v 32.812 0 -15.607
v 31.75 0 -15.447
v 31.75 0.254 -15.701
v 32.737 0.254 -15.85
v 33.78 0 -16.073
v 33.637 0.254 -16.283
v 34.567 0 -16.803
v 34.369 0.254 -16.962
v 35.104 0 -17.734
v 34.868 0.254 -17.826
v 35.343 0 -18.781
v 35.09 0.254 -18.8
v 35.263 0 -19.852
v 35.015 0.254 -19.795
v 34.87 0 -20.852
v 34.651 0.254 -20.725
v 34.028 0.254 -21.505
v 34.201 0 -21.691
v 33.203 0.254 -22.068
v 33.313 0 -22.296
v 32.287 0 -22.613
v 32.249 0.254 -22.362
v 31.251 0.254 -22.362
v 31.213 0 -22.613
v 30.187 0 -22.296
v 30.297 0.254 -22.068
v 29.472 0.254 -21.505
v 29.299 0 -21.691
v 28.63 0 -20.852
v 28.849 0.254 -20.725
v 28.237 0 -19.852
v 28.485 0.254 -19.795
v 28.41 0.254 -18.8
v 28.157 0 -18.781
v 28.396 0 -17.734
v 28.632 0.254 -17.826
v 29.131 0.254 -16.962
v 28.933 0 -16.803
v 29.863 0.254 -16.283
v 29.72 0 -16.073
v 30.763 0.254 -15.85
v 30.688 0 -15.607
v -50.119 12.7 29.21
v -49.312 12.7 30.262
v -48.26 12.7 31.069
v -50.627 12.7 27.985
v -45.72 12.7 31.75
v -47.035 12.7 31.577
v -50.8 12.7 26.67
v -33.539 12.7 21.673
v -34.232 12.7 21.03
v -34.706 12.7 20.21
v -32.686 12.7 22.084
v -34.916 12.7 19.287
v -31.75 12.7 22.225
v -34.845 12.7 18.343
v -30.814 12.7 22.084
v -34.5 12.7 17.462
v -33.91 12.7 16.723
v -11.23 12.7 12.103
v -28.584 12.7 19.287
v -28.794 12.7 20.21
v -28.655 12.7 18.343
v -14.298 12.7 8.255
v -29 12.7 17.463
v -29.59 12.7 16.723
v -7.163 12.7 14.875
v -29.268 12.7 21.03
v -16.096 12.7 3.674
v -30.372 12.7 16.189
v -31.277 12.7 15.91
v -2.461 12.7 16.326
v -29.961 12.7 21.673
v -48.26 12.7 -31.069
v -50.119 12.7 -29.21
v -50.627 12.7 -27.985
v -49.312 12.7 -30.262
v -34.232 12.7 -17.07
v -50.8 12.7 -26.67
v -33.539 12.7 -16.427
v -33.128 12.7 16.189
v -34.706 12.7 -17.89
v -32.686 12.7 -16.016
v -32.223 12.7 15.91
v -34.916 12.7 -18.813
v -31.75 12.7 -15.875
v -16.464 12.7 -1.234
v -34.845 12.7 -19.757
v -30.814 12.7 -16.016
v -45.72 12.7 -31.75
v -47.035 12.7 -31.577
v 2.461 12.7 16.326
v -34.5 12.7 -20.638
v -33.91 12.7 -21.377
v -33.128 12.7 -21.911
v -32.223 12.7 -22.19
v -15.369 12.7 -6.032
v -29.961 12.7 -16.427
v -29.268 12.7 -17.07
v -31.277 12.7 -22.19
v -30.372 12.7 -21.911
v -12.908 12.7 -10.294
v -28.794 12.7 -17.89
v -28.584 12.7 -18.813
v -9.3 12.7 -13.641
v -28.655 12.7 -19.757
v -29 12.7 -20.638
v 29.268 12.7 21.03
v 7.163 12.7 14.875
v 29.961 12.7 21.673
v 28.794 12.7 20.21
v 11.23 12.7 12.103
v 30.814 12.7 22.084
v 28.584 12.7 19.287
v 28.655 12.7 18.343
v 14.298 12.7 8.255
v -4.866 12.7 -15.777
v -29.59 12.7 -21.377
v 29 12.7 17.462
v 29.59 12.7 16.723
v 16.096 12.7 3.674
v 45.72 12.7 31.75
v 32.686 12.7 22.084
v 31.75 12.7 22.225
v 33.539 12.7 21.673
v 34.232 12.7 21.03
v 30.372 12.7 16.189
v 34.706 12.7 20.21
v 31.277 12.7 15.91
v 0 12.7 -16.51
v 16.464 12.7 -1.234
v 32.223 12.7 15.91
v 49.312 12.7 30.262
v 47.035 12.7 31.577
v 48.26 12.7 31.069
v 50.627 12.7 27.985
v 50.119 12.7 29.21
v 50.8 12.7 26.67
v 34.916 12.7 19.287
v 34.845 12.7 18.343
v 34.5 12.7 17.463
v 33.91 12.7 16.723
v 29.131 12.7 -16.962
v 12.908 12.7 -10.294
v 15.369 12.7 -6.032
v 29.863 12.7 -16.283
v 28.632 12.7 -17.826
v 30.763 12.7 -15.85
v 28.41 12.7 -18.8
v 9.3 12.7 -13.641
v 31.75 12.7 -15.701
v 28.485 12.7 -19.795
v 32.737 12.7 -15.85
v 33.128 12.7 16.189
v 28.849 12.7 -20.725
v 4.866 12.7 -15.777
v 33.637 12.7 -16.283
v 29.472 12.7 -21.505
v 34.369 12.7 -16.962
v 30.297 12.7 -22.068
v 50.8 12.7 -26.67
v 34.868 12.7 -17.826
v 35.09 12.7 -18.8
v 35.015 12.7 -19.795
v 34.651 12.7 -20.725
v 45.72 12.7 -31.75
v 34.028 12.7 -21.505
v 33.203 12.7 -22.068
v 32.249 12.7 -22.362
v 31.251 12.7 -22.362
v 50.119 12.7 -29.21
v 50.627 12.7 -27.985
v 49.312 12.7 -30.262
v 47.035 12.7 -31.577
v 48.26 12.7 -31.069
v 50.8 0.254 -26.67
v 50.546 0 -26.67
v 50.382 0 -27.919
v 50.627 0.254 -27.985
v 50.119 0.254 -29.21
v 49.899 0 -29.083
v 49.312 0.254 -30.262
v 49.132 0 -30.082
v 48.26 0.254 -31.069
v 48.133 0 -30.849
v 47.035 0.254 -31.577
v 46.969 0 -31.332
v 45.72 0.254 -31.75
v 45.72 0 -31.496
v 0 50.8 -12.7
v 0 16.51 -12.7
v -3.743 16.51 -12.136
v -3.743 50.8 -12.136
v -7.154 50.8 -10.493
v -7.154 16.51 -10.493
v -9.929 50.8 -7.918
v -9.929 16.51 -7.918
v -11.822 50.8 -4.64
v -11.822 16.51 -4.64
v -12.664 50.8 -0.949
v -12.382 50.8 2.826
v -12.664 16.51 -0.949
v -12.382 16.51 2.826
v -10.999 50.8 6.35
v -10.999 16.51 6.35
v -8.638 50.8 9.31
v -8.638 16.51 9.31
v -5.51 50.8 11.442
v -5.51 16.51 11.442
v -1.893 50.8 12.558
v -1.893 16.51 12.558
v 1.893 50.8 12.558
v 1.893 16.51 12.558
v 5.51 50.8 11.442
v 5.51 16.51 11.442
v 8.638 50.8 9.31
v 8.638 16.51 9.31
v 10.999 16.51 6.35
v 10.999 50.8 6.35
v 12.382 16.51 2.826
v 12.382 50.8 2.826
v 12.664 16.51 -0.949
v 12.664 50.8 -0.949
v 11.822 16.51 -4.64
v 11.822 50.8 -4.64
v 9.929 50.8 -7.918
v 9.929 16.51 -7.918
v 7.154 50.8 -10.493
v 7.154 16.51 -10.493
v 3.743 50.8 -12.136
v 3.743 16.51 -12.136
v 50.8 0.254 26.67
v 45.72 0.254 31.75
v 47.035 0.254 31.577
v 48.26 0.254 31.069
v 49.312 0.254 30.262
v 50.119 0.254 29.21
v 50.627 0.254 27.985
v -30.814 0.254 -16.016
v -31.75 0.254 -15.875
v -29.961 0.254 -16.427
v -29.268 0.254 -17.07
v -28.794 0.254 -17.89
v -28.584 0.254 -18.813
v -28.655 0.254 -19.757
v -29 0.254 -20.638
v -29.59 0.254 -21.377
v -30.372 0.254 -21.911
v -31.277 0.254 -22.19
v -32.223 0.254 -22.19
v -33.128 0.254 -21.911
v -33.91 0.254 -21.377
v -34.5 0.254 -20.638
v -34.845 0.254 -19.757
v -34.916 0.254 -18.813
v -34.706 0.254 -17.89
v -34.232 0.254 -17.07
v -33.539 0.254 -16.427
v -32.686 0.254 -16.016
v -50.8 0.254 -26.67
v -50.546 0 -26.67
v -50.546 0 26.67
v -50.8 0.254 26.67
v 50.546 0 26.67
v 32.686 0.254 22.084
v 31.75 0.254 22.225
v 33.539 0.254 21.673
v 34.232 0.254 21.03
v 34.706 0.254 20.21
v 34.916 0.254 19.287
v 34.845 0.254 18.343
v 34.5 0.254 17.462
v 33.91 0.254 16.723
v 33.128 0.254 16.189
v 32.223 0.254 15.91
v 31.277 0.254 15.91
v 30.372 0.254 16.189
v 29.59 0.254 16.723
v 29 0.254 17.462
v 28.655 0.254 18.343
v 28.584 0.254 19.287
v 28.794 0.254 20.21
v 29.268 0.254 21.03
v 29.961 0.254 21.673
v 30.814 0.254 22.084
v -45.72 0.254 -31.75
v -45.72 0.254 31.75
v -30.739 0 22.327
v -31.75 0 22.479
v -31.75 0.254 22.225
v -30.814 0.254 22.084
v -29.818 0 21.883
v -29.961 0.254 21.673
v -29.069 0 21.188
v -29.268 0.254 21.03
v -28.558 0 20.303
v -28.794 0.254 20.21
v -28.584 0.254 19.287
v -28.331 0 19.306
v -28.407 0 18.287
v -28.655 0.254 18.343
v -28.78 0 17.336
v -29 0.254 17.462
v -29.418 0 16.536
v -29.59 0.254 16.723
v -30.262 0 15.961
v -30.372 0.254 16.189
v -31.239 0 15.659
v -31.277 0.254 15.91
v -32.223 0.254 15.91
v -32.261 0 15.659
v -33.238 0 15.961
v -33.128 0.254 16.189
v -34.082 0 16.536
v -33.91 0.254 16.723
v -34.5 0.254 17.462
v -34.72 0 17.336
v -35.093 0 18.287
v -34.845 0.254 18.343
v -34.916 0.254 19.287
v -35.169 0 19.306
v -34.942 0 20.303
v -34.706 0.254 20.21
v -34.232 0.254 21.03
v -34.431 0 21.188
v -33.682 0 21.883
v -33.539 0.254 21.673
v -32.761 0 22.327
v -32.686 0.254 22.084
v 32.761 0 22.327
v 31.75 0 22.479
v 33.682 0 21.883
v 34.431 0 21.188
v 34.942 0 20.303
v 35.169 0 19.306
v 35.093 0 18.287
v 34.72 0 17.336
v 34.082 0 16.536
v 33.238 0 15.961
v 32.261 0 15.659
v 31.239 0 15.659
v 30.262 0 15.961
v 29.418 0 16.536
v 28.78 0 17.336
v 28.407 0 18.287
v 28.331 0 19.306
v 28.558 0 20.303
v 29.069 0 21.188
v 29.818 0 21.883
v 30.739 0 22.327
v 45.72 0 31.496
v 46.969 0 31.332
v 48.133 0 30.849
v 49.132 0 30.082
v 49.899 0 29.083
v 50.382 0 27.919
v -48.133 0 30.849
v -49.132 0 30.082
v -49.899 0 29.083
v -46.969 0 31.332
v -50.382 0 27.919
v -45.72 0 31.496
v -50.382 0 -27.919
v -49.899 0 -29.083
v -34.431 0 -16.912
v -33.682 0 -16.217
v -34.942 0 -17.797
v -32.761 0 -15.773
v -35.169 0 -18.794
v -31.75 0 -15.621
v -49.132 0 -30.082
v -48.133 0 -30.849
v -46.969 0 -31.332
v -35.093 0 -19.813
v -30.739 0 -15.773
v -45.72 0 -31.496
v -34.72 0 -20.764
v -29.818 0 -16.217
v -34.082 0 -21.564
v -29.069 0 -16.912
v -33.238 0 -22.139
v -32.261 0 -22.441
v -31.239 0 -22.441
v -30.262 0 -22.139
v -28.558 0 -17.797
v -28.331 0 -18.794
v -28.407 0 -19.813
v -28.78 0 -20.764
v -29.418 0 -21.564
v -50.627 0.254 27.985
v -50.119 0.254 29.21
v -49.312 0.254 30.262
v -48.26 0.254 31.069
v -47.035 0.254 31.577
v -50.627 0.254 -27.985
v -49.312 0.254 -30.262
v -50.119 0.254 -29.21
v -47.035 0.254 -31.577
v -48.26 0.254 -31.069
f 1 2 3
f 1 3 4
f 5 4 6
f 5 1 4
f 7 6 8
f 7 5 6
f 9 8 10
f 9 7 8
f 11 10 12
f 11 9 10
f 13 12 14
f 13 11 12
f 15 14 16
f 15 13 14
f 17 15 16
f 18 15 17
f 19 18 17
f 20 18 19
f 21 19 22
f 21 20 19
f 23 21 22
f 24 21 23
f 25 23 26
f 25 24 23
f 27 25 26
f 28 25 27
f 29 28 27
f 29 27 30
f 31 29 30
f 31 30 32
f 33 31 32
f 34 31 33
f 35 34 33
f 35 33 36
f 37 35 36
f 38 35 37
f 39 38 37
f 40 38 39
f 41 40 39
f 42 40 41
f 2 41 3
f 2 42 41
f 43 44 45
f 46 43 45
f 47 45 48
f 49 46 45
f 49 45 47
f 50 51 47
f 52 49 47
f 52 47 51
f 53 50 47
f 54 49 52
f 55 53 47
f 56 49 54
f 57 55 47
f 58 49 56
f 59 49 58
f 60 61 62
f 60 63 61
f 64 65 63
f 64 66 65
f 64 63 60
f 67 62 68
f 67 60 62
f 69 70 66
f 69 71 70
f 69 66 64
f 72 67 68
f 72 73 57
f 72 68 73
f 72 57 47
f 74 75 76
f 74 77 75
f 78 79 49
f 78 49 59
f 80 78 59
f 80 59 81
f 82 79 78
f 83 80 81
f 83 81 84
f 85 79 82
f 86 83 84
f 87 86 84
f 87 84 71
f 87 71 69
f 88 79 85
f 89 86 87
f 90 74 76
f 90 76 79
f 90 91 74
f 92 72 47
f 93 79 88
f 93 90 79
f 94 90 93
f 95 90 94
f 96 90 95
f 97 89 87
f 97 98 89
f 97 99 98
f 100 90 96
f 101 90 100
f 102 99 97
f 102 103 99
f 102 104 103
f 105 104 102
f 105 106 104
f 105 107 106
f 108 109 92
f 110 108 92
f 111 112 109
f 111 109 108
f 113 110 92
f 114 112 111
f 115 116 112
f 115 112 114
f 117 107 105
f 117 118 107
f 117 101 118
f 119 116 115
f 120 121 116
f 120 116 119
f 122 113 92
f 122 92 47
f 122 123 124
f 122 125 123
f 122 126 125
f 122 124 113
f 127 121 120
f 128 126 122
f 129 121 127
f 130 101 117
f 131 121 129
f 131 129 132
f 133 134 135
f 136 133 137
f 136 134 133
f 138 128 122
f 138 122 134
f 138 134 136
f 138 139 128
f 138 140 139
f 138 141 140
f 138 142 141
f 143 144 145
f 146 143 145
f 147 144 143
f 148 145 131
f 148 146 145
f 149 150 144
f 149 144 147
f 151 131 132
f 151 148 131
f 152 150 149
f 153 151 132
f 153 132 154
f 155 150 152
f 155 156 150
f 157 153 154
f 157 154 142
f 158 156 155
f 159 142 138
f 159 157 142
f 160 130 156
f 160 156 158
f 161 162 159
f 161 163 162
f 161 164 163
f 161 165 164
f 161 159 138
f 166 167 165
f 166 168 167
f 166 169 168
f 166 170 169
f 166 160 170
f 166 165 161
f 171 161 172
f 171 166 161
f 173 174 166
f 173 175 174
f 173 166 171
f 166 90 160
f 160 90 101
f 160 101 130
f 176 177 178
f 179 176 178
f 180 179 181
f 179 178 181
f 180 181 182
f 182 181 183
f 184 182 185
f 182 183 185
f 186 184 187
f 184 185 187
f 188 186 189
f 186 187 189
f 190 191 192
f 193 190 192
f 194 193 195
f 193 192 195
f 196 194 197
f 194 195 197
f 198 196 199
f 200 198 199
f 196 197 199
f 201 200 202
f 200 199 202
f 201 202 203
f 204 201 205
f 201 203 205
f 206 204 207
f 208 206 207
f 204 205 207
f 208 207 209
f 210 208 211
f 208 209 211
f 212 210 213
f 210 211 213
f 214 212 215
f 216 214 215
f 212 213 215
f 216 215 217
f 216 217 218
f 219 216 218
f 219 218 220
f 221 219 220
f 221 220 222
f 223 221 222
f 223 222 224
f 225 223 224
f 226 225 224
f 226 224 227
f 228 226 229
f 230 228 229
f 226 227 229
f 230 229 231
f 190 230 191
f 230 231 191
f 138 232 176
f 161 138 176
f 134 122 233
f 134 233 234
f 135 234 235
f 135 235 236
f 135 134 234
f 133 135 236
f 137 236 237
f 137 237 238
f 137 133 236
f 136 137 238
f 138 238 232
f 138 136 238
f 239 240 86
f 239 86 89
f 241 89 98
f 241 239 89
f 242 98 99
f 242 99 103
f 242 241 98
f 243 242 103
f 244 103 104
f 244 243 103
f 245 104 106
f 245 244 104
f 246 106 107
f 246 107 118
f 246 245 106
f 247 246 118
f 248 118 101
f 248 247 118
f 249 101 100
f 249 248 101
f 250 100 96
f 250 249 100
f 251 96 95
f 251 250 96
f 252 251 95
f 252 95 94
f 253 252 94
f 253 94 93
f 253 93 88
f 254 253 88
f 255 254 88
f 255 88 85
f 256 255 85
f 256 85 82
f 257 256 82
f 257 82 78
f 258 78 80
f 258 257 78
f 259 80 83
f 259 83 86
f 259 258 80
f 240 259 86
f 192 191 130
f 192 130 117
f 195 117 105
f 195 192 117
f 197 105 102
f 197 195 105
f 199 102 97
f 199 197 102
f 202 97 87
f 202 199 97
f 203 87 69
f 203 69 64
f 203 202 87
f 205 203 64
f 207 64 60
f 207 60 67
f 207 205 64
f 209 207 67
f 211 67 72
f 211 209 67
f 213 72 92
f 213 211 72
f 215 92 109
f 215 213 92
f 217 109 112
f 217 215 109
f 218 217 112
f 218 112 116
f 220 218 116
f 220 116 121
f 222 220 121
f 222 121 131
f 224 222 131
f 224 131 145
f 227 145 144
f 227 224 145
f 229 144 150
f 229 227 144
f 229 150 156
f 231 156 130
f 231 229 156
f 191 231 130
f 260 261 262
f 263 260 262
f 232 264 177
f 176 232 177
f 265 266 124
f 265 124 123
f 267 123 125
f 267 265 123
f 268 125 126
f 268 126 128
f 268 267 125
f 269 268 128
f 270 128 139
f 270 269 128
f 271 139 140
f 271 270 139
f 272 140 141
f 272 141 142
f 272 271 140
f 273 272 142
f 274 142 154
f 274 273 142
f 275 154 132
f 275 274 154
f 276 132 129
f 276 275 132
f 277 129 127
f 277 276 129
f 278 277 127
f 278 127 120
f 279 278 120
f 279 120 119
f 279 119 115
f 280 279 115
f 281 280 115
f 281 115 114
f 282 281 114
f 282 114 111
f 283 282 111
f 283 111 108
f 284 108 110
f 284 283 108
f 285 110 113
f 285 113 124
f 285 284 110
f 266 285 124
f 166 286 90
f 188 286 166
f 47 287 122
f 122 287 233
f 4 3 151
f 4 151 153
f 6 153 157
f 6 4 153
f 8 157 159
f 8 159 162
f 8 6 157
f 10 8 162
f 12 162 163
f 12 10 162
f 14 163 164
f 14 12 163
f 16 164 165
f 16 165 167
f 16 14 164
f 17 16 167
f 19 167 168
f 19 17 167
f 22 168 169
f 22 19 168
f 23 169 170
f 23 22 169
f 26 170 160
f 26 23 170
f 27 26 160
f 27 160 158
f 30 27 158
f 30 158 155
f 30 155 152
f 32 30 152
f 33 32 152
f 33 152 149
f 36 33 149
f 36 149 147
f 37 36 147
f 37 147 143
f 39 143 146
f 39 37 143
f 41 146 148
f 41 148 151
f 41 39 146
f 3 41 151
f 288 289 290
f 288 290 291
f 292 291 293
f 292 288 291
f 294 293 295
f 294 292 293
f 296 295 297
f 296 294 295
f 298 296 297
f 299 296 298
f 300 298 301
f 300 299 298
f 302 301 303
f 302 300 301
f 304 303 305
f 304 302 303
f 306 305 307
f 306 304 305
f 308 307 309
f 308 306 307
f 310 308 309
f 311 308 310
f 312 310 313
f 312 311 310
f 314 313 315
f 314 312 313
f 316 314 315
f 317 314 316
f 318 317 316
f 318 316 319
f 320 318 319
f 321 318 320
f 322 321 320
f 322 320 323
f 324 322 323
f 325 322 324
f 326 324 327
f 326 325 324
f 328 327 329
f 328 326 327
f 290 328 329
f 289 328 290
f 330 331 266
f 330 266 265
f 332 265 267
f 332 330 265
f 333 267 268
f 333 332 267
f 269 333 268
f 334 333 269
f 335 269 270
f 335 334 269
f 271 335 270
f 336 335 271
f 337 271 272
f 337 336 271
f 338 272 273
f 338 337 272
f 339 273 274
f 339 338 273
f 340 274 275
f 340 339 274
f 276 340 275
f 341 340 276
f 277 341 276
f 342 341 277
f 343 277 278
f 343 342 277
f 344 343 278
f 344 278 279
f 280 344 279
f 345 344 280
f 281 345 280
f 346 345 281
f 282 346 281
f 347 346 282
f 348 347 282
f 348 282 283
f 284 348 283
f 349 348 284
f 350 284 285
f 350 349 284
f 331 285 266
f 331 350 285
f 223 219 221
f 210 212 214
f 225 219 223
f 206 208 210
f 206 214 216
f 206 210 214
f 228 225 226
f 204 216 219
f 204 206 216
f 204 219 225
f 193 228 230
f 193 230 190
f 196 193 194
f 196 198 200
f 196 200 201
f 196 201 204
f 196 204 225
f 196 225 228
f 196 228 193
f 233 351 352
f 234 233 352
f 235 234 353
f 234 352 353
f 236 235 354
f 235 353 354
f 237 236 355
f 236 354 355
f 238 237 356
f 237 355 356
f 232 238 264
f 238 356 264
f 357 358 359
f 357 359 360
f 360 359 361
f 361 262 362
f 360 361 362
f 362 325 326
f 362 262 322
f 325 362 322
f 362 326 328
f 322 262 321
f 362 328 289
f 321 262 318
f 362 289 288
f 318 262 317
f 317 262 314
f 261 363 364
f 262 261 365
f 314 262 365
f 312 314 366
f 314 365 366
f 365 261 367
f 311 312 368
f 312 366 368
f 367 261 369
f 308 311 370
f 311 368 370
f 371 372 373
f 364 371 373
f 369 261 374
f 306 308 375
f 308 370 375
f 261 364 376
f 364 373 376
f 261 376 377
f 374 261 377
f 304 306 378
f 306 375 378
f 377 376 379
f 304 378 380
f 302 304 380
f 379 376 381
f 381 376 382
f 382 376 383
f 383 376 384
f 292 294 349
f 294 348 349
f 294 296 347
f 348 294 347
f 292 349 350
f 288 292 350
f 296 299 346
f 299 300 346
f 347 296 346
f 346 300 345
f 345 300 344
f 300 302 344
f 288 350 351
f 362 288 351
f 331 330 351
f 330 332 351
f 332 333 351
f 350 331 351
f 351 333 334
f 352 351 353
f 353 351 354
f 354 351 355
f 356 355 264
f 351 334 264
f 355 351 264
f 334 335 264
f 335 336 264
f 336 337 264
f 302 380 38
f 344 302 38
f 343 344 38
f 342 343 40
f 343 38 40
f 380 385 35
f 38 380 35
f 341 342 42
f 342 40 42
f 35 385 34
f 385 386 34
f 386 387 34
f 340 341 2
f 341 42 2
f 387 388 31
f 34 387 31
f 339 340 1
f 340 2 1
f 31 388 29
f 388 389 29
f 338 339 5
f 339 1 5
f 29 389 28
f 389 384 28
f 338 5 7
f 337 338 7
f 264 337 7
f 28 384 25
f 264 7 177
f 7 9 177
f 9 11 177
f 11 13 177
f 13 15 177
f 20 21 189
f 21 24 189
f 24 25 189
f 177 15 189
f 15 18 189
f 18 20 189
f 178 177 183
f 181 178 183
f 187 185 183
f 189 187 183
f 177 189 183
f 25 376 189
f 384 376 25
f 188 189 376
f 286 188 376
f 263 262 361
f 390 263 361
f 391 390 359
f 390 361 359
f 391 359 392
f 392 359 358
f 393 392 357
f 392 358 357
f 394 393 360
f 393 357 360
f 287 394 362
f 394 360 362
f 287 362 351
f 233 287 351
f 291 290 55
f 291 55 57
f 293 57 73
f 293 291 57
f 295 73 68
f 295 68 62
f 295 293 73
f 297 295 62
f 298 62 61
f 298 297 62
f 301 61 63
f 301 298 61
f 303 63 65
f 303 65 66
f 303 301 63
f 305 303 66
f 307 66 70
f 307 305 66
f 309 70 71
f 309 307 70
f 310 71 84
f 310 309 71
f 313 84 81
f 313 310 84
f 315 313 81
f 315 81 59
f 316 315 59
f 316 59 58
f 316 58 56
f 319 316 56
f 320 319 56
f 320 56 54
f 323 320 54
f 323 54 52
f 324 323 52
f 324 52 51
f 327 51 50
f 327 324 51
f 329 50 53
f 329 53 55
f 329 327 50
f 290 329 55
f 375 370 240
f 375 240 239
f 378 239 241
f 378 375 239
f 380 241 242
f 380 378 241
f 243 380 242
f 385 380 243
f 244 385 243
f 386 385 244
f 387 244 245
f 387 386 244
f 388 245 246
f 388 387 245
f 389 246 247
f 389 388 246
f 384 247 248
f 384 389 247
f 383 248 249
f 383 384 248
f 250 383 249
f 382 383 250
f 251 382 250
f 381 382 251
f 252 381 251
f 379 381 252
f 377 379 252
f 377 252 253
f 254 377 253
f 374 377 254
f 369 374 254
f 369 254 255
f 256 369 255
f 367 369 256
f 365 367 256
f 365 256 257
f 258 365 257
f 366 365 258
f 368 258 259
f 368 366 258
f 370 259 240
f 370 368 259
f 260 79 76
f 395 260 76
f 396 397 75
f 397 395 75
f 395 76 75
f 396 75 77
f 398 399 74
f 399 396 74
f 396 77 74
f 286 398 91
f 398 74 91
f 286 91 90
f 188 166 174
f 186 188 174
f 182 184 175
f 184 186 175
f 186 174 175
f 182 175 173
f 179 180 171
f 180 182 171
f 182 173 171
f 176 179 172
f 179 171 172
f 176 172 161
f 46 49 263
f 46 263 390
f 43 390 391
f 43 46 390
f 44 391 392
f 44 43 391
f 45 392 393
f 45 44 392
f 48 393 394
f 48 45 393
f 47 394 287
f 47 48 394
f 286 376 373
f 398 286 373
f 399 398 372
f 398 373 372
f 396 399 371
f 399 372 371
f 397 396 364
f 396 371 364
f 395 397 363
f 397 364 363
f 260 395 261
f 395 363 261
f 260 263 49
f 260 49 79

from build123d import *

# Parameters (mm, degrees)
SKETCH1_W           = 101.6
SKETCH1_H           = 63.5
SKETCH1_R           = 3.175
SKETCH1_R_2         = 3.349234597
BOSS_EXTRUDE1_DEPTH = 12.7
SKETCH2_R           = 12.7
BOSS_EXTRUDE2_DEPTH = 38.1
CHAMFER1_SIZE       = 3.81
FILLET1_R           = 5.08
CHAMFER2_SIZE       = 0.254


with BuildPart() as part:
    # Sketch1 → Boss-Extrude1 (new body)
    with BuildSketch(Plane(origin=(0, 0, 0), x_dir=(1, 0, 0), z_dir=(0, 1, 0))):
        Rectangle(SKETCH1_W, SKETCH1_H)
        with Locations(Location((-31.75, 19.05, 0), (0, 0, 270))):
            Circle(SKETCH1_R, mode=Mode.SUBTRACT)
        with Locations(Location((-31.75, -19.05, 0), (0, 0, 270))):
            Circle(SKETCH1_R, mode=Mode.SUBTRACT)
        with Locations(Location((31.75, -19.05, 0), (0, 0, 270))):
            Circle(SKETCH1_R, mode=Mode.SUBTRACT)
        with Locations(Location((31.75, 19.05, 0), (0, 0, 270))):
            Circle(SKETCH1_R_2, mode=Mode.SUBTRACT)
    extrude(amount=BOSS_EXTRUDE1_DEPTH)

    # Sketch2 → Boss-Extrude2 (add)
    with BuildSketch(Plane(origin=(0, 12.7, 0), x_dir=(1, 0, 0), z_dir=(0, 1, 0))):
        with Locations(Location((0, 0, 0), (0, 0, 90))):
            Circle(SKETCH2_R)
    extrude(amount=BOSS_EXTRUDE2_DEPTH)

    # Chamfer1
    chamfer1_edges = [part.edges().sort_by_distance(p)[0] for p in [
        (0, 12.7, 12.7),
    ]]
    chamfer(chamfer1_edges, length=CHAMFER1_SIZE)

    # Fillet1
    fillet1_edges = [part.edges().sort_by_distance(p)[0] for p in [
        (50.8, 6.35, 31.75),
        (-50.8, 6.35, 31.75),
        (-50.8, 6.35, -31.75),
        (50.8, 6.35, -31.75),
    ]]
    fillet(fillet1_edges, radius=FILLET1_R)

    # Chamfer2
    chamfer2_edges = [part.edges().sort_by_distance(p)[0] for p in [
        (-31.75, 0, 15.875),
        (-31.75, 0, -22.225),
        (31.75, 0, 15.875),
        (31.75, 0, -22.399234597),
        (0, 0, 31.75),
        (50.8, 0, 0),
        (-50.8, 0, 0),
        (0, 0, -31.75),
        (-49.312102448, 0, -30.262102448),
        (49.312102448, 0, -30.262102448),
        (49.312102448, 0, 30.262102448),
        (-49.312102448, 0, 30.262102448),
    ]]
    chamfer(chamfer2_edges, length=CHAMFER2_SIZE)


solid = part.part
